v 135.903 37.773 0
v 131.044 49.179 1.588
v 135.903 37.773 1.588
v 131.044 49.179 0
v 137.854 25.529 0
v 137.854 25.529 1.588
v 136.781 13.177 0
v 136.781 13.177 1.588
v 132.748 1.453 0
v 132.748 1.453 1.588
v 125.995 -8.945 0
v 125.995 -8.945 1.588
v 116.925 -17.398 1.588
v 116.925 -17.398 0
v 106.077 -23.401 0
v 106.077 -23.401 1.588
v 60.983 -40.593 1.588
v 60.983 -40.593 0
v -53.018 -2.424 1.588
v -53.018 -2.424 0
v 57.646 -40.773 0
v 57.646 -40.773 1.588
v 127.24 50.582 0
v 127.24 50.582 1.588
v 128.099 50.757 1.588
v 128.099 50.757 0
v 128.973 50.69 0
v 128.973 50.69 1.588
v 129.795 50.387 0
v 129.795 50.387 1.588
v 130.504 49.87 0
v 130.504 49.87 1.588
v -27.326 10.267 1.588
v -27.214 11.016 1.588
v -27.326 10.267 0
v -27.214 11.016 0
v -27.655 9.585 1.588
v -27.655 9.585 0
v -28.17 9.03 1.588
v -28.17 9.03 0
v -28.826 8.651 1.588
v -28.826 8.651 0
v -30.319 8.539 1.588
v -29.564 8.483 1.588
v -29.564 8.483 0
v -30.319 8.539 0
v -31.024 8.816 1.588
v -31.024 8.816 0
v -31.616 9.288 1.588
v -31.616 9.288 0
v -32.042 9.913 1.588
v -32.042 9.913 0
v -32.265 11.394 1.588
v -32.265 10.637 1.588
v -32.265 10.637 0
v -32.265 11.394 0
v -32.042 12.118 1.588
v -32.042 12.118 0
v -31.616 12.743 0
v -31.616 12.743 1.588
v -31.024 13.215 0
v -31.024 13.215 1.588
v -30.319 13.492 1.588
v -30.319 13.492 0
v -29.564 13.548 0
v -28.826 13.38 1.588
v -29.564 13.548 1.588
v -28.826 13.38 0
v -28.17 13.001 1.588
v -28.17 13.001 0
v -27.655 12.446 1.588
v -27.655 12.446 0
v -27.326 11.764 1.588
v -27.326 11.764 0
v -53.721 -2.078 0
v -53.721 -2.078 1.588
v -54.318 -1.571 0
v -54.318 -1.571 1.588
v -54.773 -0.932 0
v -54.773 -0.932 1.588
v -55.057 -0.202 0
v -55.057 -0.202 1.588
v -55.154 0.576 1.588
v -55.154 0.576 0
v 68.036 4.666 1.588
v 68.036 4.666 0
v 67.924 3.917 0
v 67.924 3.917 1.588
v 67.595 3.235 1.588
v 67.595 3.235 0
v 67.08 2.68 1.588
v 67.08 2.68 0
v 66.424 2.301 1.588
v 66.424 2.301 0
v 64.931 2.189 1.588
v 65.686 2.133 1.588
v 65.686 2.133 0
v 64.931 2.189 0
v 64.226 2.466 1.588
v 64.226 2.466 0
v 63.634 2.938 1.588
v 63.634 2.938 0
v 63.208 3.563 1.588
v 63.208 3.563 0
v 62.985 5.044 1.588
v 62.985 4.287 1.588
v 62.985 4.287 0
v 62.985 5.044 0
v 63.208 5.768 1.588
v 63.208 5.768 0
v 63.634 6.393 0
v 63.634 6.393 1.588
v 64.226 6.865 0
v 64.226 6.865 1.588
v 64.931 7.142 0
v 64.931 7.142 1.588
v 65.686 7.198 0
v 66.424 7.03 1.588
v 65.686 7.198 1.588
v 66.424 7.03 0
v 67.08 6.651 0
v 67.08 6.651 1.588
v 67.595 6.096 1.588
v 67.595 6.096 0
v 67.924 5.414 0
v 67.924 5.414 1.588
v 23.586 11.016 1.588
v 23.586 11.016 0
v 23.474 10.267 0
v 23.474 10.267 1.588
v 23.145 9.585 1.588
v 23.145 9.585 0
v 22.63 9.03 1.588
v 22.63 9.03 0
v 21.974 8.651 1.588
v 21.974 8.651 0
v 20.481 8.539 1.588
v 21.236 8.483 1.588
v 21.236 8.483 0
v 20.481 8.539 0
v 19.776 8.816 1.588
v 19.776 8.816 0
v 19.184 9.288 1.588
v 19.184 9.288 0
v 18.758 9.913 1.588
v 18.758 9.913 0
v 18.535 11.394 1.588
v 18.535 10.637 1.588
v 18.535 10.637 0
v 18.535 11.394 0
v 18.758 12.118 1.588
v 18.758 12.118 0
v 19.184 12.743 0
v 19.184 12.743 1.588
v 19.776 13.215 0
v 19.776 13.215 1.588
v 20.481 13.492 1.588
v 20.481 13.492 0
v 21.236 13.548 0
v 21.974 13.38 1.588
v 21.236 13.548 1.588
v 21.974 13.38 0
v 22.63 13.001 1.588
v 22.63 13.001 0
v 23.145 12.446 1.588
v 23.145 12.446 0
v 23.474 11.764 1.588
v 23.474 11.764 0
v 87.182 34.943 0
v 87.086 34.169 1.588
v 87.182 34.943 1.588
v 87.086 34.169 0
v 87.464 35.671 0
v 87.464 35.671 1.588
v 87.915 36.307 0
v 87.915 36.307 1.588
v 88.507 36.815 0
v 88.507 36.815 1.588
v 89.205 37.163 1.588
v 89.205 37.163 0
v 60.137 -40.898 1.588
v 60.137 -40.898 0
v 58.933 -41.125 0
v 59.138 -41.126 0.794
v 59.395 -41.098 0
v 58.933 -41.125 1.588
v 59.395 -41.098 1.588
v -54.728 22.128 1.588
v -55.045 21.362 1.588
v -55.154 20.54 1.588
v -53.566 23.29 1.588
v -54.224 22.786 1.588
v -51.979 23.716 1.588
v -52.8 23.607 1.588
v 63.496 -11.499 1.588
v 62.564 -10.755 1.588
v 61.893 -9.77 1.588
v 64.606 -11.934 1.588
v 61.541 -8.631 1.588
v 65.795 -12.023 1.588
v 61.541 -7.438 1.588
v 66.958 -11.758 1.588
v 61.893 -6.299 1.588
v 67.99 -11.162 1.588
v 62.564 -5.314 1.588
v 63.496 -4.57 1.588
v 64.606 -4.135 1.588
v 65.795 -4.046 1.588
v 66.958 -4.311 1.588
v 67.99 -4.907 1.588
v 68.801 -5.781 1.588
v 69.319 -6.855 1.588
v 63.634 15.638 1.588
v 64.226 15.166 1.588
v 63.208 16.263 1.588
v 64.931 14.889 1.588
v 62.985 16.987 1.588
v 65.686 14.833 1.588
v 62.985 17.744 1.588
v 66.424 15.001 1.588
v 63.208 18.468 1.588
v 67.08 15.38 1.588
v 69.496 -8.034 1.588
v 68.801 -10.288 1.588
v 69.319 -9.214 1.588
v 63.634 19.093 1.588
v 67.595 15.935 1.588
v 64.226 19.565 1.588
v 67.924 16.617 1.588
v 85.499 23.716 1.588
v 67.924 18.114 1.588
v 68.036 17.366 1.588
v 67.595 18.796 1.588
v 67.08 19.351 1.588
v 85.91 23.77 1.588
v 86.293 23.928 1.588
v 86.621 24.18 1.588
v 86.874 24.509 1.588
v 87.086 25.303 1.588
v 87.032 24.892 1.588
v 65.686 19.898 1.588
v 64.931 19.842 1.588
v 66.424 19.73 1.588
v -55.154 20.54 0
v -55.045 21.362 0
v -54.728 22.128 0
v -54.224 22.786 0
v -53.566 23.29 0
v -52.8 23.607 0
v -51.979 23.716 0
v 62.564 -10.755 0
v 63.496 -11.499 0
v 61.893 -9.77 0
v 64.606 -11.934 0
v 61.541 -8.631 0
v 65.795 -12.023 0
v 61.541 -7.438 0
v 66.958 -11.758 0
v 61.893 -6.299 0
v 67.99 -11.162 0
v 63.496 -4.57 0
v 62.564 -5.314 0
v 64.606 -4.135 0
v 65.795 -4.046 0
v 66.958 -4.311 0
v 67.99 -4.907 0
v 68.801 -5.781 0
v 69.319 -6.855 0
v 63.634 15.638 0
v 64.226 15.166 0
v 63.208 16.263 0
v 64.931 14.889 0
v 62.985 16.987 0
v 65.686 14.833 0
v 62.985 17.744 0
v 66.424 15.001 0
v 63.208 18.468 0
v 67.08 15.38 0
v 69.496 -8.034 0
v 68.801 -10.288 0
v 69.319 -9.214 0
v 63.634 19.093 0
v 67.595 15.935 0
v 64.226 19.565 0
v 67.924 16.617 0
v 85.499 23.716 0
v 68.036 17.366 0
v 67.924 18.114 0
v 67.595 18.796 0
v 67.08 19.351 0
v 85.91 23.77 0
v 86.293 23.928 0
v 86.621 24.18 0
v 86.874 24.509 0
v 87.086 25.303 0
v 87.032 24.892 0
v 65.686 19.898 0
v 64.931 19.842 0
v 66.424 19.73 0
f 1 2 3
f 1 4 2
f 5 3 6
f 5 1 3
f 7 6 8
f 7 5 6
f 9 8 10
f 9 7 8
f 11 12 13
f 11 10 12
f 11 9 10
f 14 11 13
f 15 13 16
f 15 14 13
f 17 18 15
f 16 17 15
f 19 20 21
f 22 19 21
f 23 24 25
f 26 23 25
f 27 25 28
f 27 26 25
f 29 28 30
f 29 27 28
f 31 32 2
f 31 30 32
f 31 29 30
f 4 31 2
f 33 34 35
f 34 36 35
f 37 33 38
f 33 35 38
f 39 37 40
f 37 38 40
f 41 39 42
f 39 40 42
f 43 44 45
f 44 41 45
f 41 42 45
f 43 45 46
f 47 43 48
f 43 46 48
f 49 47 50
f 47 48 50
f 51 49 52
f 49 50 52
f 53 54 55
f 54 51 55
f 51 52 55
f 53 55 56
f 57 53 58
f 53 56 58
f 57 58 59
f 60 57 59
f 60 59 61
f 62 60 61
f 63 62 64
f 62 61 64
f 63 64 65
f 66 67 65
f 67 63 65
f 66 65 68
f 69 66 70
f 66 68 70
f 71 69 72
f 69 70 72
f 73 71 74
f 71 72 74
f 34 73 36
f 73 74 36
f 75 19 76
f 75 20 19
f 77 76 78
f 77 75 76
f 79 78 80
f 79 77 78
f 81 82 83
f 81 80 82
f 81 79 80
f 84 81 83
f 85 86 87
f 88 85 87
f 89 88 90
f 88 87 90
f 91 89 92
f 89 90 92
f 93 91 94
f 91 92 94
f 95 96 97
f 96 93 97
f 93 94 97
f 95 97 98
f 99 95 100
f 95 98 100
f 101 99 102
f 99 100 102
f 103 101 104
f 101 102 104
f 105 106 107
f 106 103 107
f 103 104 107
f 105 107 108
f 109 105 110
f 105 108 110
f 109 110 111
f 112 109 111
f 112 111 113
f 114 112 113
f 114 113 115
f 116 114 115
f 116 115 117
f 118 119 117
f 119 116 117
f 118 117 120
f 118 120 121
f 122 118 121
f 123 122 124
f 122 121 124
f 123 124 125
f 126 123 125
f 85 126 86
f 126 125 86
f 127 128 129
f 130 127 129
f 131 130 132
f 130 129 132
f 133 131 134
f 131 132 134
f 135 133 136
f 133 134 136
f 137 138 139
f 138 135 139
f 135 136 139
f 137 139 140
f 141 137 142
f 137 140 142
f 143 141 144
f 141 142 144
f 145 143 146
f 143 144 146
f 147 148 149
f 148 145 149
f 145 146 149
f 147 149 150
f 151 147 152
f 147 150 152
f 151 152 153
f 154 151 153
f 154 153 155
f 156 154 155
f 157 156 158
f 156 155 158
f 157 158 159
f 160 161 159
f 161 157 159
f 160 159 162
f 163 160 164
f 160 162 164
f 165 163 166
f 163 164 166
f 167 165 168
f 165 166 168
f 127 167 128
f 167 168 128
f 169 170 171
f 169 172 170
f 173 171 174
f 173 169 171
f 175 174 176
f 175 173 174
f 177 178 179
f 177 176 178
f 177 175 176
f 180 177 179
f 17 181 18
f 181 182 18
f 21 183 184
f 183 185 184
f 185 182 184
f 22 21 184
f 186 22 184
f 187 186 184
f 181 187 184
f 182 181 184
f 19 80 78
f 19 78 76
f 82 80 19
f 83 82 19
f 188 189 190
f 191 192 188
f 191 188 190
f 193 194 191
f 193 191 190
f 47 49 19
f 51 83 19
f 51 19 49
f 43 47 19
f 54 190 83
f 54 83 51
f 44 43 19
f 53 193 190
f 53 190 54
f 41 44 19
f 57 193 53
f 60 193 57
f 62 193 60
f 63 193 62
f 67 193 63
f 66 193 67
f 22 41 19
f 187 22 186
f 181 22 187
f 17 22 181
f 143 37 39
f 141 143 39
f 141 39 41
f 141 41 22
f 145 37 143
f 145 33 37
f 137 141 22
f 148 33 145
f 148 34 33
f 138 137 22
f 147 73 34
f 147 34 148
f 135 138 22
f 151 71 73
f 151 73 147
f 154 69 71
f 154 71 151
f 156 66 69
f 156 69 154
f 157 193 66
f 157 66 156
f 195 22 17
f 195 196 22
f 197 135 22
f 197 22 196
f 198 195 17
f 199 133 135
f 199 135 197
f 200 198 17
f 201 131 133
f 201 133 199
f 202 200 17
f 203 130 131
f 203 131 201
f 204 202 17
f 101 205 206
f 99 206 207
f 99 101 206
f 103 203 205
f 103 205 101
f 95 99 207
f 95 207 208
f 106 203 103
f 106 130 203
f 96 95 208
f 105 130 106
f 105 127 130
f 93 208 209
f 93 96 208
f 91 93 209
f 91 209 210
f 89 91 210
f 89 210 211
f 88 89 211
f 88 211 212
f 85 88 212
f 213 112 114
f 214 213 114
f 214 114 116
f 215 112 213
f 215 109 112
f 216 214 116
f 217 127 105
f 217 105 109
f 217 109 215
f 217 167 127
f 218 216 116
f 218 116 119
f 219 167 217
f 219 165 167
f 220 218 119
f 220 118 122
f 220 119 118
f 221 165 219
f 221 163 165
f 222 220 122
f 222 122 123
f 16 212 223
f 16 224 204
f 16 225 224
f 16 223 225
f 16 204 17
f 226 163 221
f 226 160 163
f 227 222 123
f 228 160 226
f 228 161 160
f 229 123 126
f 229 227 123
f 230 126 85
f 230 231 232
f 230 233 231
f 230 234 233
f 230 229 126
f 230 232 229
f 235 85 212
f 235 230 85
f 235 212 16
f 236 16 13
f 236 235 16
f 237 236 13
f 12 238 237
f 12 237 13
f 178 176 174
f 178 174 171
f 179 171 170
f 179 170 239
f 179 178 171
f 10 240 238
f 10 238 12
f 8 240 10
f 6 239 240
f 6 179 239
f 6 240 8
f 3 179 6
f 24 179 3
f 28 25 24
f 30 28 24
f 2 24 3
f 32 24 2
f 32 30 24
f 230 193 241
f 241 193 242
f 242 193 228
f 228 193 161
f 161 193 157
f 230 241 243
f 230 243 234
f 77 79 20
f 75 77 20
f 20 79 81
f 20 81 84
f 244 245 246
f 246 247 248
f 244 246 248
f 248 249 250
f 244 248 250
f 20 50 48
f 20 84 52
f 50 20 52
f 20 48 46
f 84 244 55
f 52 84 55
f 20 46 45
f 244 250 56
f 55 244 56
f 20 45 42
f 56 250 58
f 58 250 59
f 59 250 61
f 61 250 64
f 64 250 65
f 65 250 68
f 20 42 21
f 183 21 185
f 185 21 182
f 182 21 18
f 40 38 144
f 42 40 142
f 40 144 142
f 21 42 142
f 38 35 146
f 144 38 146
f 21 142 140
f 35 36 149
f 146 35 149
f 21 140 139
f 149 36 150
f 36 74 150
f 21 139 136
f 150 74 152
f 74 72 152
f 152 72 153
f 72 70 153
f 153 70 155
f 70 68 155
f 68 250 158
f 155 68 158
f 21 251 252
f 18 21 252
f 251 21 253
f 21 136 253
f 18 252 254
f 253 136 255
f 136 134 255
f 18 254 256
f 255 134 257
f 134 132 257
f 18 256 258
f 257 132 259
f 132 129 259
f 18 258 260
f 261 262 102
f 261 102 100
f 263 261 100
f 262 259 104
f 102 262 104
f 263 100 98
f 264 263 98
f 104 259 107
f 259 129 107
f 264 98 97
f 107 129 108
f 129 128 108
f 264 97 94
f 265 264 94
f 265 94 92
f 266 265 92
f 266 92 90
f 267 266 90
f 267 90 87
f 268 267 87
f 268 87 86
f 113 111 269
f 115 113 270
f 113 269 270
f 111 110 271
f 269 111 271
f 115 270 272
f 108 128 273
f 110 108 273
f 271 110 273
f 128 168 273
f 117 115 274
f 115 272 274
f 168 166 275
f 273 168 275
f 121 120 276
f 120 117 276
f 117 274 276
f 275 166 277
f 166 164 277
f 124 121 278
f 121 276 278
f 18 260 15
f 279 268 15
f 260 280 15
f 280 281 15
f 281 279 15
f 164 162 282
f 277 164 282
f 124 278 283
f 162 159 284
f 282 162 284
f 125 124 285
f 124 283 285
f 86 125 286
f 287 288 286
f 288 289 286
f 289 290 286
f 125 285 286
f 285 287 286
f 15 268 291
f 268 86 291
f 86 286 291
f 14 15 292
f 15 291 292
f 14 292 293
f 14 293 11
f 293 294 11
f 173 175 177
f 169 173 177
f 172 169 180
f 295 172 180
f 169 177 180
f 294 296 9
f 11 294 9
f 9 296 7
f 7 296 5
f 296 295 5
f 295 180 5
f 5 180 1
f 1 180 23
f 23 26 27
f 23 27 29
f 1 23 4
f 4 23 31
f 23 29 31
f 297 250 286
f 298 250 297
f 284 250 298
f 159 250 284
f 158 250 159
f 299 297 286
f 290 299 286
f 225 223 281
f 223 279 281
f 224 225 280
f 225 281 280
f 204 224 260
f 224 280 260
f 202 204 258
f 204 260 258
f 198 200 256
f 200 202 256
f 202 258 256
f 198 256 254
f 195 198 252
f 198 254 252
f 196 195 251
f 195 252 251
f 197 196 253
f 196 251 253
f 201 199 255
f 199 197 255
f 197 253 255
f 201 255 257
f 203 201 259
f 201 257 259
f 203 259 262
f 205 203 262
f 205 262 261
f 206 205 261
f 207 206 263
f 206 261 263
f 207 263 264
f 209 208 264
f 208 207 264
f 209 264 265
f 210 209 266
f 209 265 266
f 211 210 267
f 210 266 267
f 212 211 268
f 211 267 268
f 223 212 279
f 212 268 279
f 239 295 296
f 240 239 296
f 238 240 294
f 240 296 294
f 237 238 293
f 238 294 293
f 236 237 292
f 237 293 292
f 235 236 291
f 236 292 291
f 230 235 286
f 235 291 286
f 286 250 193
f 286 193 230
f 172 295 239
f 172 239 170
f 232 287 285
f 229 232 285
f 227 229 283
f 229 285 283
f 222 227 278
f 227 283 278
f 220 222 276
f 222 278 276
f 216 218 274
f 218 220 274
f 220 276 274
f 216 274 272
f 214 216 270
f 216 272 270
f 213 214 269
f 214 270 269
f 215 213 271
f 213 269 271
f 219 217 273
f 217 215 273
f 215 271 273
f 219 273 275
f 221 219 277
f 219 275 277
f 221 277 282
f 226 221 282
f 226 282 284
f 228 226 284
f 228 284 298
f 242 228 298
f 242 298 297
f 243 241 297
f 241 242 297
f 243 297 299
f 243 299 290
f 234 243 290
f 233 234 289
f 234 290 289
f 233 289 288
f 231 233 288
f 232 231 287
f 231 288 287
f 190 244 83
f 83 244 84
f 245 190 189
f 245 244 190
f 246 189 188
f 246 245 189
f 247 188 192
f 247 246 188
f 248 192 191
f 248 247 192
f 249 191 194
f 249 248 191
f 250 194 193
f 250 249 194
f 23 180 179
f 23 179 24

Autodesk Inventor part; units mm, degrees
ref_plane "YZ Plane" through (0, 0, 0) normal (1, 0, 0) x (0, 1, 0)
ref_plane "XZ Plane" through (0, 0, 0) normal (0, 1, 0) x (-1, 0, 0)
ref_plane "XY Plane" through (0, 0, 0) normal (0, 0, 1) x (1, 0, 0)
sketch "Sketch1" plane through (0, 0, 0) normal (0, 0, 1) x (1, 0, 0)
  spline S0 degree 3 poles (57.6456, -40.773) (58.3081, -40.9936) (59.0965, -41.3227) (60.2711, -40.8533) (60.9829, -40.5929) knots 0 0 0 0 0.471955 1 1 1 1
  line L0 (57.6456, -40.773) -> (58.3081, -40.9936) construction
  line L1 (58.3081, -40.9936) -> (59.0965, -41.3227) construction
  line L2 (59.0965, -41.3227) -> (60.2711, -40.8533) construction
  line L3 (60.2711, -40.8533) -> (60.9829, -40.5929) construction
  circle A0 centre (65.4964, 17.3655) radius 2.54
  circle A1 centre (65.4964, 4.6655) radius 2.54
  circle A2 centre (65.4964, -8.0345) radius 4
  circle A3 centre (21.0464, 11.0155) radius 2.54
  arc A4 (106.077, -23.4013) -> (131.0436, 49.1793) centre (87.0864, 23.7155) ccw
  line L4 (87.0864, 25.303) -> (87.0864, 34.1689)
  line L5 (89.2051, 37.163) -> (127.2399, 50.5819)
  circle A5 centre (-29.7536, 11.0155) radius 2.54
  line L6 (-51.9786, 23.7155) -> (85.4989, 23.7155)
  line L7 (60.9829, -40.5929) -> (106.077, -23.4013)
  line L8 (-55.1536, 20.5405) -> (-55.1536, 0.5755)
  line L9 (-53.0182, -2.4244) -> (57.6456, -40.773)
  arc A6 (-51.9786, 23.7155) -> (-55.1536, 20.5405) centre (-51.9786, 20.5405) ccw
  arc A7 (-55.1536, 0.5755) -> (-53.0182, -2.4244) centre (-51.9786, 0.5755) ccw
  arc A8 (131.0436, 49.1793) -> (127.2399, 50.5819) centre (128.2963, 47.5878) ccw
  arc A9 (89.2051, 37.163) -> (87.0864, 34.1689) centre (90.2614, 34.1689) ccw
  arc A10 (85.4989, 23.7155) -> (87.0864, 25.303) centre (85.4989, 25.303) ccw
  point P0 (129.6573, 51.4348)
  point P1 (129.6573, 51.4348)
  point P2 (-55.1536, 23.7155)
  point P3 (-55.1536, -1.6845)
  point P4 (60.9902, -40.5901)
  point P5 (129.6573, 51.4348)
  point P6 (87.0864, 36.4155)
  point P7 (60.9829, -40.5929)
  dimension "d2" = 3.175
  dimension "d3" = 1.5875
extrude "Extrusion1" add sketch "Sketch1" along normal blind 1.5875
properties part number "intake_sled"
